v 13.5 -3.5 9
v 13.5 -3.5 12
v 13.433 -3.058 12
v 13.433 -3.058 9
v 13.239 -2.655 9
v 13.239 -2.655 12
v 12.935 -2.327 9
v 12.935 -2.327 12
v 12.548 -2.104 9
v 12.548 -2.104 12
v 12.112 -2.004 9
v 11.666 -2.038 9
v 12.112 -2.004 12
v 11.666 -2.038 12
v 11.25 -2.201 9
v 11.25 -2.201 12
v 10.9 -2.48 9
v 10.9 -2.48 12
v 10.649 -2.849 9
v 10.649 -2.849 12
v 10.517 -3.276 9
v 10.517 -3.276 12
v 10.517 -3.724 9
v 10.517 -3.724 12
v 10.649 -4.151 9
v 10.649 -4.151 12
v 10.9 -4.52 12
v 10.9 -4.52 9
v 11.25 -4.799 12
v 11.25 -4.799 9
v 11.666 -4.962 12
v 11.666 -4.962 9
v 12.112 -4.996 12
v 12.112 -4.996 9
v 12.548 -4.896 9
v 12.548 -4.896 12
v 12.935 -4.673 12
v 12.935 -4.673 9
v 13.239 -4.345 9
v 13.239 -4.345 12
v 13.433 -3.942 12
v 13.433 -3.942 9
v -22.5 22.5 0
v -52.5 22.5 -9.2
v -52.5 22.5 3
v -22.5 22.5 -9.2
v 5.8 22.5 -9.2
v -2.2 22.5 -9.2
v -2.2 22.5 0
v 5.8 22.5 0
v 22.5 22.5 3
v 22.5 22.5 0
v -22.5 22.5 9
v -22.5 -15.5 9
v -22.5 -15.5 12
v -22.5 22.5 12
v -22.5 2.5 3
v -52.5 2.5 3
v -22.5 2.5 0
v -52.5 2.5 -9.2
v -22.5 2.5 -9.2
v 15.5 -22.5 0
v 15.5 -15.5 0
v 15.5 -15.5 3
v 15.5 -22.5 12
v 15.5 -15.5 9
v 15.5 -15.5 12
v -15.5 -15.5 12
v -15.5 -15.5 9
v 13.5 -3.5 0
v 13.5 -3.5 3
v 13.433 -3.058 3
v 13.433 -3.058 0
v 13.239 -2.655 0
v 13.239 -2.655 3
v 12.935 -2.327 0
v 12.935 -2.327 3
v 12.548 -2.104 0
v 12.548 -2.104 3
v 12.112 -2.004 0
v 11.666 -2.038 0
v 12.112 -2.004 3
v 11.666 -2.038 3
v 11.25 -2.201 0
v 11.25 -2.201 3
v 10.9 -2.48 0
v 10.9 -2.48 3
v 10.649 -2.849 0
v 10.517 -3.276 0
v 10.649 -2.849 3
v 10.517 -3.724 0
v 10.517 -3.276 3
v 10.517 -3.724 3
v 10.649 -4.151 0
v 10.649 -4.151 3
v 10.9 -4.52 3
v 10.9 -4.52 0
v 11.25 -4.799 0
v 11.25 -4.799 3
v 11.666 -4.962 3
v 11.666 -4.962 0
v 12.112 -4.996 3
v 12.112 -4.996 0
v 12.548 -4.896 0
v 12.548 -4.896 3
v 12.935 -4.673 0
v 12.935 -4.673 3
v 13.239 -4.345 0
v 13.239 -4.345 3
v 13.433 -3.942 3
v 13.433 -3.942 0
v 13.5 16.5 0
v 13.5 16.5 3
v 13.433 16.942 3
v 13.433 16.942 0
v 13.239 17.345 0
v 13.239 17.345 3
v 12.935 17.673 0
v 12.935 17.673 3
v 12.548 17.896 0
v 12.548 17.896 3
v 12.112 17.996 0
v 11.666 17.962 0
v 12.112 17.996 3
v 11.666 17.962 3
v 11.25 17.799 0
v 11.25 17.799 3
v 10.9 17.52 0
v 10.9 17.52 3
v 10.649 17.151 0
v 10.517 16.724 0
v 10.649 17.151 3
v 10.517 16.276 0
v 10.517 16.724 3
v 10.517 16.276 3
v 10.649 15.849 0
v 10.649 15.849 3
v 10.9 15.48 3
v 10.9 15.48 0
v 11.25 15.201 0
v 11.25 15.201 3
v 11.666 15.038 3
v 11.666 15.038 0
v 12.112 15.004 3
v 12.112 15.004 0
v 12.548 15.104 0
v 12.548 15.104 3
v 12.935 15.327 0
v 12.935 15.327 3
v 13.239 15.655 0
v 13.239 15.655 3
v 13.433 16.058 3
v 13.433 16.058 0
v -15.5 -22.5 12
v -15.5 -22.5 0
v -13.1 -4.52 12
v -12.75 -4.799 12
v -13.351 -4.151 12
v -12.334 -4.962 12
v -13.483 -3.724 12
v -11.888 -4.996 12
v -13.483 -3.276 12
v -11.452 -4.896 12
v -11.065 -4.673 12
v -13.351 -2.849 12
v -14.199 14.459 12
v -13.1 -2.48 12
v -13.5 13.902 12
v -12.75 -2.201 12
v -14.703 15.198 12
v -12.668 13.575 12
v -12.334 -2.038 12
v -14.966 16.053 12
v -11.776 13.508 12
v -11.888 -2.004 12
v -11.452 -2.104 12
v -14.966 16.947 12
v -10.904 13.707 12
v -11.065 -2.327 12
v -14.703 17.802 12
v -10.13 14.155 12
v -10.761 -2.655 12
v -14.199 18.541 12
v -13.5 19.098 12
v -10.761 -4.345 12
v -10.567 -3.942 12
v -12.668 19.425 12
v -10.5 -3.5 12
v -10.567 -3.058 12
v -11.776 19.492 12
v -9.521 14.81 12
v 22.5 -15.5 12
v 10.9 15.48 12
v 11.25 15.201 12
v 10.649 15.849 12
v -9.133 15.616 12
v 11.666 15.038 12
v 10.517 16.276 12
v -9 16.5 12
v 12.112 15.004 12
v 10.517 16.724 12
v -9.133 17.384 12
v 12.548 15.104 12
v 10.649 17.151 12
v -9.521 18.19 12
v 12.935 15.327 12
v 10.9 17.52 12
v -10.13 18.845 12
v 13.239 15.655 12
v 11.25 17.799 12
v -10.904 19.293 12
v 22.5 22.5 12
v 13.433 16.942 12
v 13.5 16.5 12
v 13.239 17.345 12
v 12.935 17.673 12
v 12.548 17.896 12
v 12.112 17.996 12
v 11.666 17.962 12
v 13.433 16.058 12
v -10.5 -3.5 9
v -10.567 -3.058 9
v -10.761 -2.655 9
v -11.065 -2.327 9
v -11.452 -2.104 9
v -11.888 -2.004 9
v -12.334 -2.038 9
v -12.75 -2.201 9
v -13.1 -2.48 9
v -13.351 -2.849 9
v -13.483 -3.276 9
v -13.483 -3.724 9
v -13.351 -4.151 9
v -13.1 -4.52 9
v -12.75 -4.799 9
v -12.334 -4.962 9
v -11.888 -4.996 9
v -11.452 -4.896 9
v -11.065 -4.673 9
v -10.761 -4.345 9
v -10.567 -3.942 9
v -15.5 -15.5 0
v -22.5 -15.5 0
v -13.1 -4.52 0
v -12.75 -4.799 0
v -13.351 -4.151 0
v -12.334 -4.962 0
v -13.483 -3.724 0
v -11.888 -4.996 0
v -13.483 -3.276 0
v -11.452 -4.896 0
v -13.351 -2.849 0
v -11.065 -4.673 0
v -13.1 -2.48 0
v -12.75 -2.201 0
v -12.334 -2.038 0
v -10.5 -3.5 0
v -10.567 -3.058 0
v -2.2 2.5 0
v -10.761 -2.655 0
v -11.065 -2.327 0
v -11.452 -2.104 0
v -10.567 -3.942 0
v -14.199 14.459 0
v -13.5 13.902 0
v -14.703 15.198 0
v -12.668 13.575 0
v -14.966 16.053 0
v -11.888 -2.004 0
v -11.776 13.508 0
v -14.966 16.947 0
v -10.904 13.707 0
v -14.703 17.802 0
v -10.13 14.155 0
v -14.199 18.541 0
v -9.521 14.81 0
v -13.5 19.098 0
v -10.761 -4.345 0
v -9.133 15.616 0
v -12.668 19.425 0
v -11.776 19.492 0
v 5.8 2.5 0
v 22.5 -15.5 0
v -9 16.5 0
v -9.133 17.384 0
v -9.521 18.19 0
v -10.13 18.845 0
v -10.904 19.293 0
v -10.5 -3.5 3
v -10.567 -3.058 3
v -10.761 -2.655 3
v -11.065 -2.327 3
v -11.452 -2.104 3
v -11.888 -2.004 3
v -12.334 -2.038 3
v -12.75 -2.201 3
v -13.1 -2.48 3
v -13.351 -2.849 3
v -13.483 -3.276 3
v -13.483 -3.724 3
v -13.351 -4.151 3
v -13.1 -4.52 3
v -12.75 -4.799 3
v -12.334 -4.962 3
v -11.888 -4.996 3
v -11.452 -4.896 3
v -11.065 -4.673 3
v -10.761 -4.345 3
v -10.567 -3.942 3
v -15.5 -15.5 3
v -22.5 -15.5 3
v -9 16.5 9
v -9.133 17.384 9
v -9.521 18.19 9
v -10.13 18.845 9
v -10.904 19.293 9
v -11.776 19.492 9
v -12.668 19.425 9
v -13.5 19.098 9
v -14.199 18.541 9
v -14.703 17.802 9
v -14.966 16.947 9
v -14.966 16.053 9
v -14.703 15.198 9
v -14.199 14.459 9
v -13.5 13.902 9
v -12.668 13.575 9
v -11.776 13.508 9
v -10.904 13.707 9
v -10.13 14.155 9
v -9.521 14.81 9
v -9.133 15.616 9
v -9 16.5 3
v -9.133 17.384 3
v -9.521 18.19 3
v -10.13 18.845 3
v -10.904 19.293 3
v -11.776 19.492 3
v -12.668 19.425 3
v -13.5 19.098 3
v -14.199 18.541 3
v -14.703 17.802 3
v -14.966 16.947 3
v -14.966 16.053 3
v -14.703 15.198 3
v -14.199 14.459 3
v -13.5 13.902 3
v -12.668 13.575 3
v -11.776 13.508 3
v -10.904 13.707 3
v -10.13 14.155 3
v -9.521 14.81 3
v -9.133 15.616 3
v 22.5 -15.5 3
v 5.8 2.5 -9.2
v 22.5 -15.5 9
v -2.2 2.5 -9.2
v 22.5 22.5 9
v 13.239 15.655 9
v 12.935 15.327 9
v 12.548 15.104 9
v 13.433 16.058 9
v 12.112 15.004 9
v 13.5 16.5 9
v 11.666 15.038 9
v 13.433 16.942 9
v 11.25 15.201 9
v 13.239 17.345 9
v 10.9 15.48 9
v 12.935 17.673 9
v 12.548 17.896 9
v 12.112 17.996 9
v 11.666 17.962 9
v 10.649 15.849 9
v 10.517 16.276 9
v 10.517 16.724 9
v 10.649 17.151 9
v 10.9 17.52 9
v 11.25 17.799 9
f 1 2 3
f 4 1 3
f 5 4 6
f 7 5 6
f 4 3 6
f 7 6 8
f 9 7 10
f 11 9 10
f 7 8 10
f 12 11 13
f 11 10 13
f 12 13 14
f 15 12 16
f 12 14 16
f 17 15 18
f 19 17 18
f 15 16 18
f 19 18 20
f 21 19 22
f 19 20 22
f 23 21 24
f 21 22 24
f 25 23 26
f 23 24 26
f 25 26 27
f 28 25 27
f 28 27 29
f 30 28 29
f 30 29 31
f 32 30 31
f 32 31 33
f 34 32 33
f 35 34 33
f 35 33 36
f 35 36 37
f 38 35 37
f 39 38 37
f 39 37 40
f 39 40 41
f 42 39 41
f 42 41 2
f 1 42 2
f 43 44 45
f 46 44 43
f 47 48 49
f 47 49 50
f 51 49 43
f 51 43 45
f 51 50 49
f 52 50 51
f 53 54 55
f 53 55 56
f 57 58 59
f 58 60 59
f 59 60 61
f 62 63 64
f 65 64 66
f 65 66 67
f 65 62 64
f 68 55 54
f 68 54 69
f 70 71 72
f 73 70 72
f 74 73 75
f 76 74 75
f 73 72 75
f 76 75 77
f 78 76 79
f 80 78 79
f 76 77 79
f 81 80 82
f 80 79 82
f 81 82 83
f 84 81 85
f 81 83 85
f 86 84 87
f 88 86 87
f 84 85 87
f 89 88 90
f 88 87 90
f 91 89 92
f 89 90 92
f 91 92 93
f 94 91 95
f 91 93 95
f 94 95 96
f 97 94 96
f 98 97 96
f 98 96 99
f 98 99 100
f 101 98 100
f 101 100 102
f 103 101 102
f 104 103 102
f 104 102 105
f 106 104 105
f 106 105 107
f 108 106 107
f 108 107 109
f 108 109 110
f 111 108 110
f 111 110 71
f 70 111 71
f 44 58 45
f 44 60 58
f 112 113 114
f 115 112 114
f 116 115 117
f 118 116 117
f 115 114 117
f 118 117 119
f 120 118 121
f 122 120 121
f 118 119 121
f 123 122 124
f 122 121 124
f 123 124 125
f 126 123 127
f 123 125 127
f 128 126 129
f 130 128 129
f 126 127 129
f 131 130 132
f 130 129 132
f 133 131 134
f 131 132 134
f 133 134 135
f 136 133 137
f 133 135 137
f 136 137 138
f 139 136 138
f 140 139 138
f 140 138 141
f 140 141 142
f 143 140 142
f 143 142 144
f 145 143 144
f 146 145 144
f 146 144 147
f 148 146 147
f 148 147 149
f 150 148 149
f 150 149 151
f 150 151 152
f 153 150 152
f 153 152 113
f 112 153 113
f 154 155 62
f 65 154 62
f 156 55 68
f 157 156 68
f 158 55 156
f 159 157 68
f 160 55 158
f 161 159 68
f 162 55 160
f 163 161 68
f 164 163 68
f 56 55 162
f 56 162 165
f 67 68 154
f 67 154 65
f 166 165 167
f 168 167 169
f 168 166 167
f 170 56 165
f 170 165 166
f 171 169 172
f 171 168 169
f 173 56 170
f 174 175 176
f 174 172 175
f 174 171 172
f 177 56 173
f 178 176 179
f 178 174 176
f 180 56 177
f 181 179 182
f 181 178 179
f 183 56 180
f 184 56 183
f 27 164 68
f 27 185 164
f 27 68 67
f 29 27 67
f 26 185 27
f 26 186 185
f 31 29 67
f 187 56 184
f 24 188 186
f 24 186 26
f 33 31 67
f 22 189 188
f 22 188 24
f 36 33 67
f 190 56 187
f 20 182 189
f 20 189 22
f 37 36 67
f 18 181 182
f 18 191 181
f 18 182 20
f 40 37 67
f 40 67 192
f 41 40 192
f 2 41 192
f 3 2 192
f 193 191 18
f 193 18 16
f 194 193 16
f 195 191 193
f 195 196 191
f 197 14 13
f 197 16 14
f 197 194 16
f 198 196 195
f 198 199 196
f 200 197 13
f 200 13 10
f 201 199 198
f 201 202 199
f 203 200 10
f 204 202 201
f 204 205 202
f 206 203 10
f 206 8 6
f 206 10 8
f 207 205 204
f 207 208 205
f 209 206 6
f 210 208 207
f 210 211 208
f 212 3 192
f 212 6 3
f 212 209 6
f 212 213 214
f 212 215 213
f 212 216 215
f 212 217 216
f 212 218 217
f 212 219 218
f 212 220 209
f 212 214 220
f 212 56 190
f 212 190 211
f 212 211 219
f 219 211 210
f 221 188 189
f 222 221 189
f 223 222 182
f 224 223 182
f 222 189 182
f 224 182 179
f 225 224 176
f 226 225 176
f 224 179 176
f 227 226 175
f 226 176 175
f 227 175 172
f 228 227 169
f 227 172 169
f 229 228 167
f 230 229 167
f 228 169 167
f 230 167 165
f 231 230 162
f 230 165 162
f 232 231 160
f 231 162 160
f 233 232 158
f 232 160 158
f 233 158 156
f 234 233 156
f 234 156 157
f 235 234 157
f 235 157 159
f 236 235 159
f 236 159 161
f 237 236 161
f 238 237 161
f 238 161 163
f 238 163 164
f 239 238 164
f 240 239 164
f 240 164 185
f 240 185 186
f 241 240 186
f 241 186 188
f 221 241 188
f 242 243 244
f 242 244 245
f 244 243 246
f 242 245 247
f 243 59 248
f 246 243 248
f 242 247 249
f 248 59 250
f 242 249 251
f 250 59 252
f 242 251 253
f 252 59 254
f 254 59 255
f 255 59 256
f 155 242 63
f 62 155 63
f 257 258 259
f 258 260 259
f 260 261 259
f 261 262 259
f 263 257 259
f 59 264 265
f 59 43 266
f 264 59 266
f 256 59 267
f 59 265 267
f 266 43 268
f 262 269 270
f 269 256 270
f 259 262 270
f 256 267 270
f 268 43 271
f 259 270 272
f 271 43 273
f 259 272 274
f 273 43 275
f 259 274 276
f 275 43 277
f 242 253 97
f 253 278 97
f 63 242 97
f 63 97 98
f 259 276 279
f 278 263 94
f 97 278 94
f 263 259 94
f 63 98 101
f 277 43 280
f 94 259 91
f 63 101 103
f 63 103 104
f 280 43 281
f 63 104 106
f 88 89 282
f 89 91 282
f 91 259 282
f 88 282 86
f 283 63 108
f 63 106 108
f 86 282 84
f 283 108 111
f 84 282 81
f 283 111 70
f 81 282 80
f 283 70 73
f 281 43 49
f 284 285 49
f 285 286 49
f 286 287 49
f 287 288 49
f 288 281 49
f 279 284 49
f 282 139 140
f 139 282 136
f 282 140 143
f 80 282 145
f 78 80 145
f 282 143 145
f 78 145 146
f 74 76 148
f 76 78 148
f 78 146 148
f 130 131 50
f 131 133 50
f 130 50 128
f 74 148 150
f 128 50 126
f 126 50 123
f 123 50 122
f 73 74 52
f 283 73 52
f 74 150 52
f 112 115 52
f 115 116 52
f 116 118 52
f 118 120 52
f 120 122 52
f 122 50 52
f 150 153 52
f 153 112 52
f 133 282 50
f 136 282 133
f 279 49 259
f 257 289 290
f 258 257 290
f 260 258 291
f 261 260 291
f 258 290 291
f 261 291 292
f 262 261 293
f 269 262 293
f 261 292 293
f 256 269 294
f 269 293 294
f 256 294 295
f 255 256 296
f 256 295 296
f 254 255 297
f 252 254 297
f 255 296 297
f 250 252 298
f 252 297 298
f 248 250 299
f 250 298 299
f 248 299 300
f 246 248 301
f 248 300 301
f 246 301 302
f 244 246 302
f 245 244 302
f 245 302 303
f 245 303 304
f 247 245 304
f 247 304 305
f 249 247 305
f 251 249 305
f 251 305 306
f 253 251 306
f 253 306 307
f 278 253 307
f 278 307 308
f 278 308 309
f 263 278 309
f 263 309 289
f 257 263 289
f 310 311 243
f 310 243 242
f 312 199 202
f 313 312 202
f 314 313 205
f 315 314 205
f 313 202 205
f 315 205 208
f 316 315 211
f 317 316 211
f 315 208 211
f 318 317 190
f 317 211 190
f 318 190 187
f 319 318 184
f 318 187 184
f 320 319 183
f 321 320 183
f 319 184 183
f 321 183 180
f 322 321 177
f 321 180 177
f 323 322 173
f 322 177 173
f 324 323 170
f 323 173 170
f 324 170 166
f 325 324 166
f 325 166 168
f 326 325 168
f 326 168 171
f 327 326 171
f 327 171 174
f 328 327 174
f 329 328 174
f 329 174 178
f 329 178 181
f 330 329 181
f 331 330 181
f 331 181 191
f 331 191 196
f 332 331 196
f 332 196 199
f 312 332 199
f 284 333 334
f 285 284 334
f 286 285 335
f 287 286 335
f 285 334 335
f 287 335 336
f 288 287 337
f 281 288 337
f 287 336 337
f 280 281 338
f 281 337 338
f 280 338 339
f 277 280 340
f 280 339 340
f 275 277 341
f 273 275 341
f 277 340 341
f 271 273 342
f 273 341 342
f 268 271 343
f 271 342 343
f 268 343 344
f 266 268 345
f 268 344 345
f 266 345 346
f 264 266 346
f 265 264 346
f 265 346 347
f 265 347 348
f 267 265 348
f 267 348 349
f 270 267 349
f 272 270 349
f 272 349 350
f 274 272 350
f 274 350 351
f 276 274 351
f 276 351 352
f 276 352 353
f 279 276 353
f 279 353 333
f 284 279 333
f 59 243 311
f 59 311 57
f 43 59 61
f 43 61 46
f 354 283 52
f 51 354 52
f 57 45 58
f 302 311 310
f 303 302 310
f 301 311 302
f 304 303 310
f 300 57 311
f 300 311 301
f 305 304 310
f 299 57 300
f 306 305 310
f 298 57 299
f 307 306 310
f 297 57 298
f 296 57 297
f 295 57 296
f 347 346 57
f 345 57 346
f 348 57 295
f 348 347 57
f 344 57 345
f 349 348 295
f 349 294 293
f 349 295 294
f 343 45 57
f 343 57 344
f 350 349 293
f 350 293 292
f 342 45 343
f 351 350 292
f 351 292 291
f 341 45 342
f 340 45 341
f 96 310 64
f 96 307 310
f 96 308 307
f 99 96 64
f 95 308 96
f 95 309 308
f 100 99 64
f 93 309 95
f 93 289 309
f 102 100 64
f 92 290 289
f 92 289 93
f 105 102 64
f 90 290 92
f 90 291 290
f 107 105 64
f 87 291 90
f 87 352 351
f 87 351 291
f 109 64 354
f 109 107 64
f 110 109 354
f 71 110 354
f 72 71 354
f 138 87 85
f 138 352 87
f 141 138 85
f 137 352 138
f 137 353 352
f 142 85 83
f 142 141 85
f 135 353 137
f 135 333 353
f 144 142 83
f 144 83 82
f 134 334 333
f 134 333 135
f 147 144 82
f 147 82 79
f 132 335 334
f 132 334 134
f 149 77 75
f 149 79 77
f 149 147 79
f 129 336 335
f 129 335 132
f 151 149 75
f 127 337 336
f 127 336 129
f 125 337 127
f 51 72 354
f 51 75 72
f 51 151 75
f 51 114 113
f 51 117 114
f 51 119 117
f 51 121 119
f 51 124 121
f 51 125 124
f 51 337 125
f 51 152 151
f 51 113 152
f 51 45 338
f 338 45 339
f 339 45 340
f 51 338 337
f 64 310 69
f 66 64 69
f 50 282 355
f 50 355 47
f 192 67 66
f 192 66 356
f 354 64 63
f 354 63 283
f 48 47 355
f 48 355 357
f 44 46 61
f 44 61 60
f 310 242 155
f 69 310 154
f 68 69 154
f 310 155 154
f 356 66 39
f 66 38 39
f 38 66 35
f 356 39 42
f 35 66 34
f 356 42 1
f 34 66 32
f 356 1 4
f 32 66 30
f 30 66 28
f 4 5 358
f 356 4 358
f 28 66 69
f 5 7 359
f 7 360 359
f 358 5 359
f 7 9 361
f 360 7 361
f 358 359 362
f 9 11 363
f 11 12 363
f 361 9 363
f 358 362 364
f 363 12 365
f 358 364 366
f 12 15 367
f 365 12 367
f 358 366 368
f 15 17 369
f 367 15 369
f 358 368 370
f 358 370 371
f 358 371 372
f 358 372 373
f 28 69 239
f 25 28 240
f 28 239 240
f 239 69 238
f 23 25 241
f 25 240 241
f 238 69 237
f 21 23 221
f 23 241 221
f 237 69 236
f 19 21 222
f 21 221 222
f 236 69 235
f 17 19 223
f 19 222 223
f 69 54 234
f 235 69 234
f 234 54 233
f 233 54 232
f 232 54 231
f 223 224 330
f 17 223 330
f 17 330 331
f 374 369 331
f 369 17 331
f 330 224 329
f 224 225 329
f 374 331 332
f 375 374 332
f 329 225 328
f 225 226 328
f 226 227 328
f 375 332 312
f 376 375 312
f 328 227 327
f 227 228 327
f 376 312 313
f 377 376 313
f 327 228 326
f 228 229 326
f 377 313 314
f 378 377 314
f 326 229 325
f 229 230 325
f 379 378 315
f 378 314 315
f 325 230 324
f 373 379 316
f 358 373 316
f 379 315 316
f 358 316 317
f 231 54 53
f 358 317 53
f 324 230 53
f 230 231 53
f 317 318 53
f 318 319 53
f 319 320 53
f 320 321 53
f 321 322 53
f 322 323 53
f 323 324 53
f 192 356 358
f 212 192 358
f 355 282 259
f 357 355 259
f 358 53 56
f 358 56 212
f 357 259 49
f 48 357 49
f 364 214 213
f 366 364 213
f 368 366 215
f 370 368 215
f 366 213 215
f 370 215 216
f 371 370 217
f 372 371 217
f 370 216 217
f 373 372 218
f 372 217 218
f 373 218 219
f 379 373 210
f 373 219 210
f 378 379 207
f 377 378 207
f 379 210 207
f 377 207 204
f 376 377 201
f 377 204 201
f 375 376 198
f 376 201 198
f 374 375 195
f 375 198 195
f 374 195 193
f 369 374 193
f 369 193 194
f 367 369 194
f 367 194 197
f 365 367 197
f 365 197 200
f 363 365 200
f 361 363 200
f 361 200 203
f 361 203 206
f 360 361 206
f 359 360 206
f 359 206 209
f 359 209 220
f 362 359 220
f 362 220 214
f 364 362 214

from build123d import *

# Parameters (mm, degrees)
SKETCH_1_W          = 45
SKETCH_1_H          = 45
EXTRUDE_1_DEPTH     = 12
SKETCH_2_W          = 6
SKETCH_2_H          = 38
CUT_EXTRUDE_1_DEPTH = 52.722818949
SKETCH_3_R          = 3
SKETCH_3_R_2        = 1.5
CUT_EXTRUDE_2_DEPTH = 35.007352146
SKETCH_4_R          = 1.5
CUT_EXTRUDE_3_DEPTH = 35.007352146
SKETCH_6_W          = 7
SKETCH_6_H          = 12
CUT_EXTRUDE_4_DEPTH = 7
SKETCH_7_W          = 30
SKETCH_7_H          = 20
SKETCH_7_W_2        = 8
EXTRUDE_2_DEPTH     = 9.2
SKETCH_9_W          = 30
SKETCH_9_H          = 20
EXTRUDE_4_DEPTH     = 3


with BuildPart() as part:
    # 草图1 → 凸台-拉伸1 (new body)
    with BuildSketch(Plane.XY):
        Rectangle(SKETCH_1_W, SKETCH_1_H)
    extrude(amount=EXTRUDE_1_DEPTH)

    # 草图2 → 切除-拉伸1 (cut, through all)
    with BuildSketch(Plane.ZY.offset(22.5)):
        with Locations((6, 3.5)):
            Rectangle(SKETCH_2_W, SKETCH_2_H)
    extrude(amount=-CUT_EXTRUDE_1_DEPTH, mode=Mode.SUBTRACT)

    # 草图3 → 切除-拉伸2 (cut, through all)
    with BuildSketch(Plane.XY.offset(12)):
        with Locations((-12, 16.5)):
            Circle(SKETCH_3_R)
        with Locations((12, 16.5)):
            Circle(SKETCH_3_R_2)
    extrude(amount=-CUT_EXTRUDE_2_DEPTH, mode=Mode.SUBTRACT)

    # 草图4 → 切除-拉伸3 (cut, through all)
    with BuildSketch(Plane.XY.offset(12)):
        with Locations((-12, -3.5)):
            Circle(SKETCH_4_R)
        with Locations((12, -3.5)):
            Circle(SKETCH_4_R)
    extrude(amount=-CUT_EXTRUDE_3_DEPTH, mode=Mode.SUBTRACT)

    # 草图6 → 切除-拉伸4 (cut)
    with BuildSketch(Plane.XZ.offset(22.5)):
        with Locations((-19, 6)):
            Rectangle(SKETCH_6_W, SKETCH_6_H)
        with Locations((19, 6)):
            Rectangle(SKETCH_6_W, SKETCH_6_H)
    extrude(amount=-CUT_EXTRUDE_4_DEPTH, mode=Mode.SUBTRACT)

    # 草图7 → 凸台-拉伸2 (add)
    with BuildSketch(Plane(origin=(0, 0, 0), x_dir=(-1, 0, 0), z_dir=(0, 0, -1))):
        with Locations((37.5, 12.5)):
            Rectangle(SKETCH_7_W, SKETCH_7_H)
        with Locations((-1.8, 12.5)):
            Rectangle(SKETCH_7_W_2, SKETCH_7_H)
    extrude(amount=EXTRUDE_2_DEPTH)


with BuildPart() as extrude_2_piece_1:
    # of the separate pieces the step leaves, piece 1, a body of its own (extrude_2_pieces)
    add(part.part.solids().sort_by_distance((15.5, -22.5, 0))[0])



with BuildPart() as extrude_2_piece_2:
    # of the separate pieces the step leaves, piece 2, a body of its own (extrude_2_pieces)
    add(part.part.solids().sort_by_distance((-22.5, 2.5, -9.2))[0])


with BuildPart() as extrude_2_piece_1_1:
    add(extrude_2_piece_1.part)

    add(extrude_2_piece_2.part)  # 凸台-拉伸4 merges 凸台-拉伸2 piece 2
    # 草图9 → 凸台-拉伸4 (add)
    with BuildSketch(Plane.XY):
        with Locations((-37.5, 12.5)):
            Rectangle(SKETCH_9_W, SKETCH_9_H)
    extrude(amount=EXTRUDE_4_DEPTH)


solid = extrude_2_piece_1_1.part
